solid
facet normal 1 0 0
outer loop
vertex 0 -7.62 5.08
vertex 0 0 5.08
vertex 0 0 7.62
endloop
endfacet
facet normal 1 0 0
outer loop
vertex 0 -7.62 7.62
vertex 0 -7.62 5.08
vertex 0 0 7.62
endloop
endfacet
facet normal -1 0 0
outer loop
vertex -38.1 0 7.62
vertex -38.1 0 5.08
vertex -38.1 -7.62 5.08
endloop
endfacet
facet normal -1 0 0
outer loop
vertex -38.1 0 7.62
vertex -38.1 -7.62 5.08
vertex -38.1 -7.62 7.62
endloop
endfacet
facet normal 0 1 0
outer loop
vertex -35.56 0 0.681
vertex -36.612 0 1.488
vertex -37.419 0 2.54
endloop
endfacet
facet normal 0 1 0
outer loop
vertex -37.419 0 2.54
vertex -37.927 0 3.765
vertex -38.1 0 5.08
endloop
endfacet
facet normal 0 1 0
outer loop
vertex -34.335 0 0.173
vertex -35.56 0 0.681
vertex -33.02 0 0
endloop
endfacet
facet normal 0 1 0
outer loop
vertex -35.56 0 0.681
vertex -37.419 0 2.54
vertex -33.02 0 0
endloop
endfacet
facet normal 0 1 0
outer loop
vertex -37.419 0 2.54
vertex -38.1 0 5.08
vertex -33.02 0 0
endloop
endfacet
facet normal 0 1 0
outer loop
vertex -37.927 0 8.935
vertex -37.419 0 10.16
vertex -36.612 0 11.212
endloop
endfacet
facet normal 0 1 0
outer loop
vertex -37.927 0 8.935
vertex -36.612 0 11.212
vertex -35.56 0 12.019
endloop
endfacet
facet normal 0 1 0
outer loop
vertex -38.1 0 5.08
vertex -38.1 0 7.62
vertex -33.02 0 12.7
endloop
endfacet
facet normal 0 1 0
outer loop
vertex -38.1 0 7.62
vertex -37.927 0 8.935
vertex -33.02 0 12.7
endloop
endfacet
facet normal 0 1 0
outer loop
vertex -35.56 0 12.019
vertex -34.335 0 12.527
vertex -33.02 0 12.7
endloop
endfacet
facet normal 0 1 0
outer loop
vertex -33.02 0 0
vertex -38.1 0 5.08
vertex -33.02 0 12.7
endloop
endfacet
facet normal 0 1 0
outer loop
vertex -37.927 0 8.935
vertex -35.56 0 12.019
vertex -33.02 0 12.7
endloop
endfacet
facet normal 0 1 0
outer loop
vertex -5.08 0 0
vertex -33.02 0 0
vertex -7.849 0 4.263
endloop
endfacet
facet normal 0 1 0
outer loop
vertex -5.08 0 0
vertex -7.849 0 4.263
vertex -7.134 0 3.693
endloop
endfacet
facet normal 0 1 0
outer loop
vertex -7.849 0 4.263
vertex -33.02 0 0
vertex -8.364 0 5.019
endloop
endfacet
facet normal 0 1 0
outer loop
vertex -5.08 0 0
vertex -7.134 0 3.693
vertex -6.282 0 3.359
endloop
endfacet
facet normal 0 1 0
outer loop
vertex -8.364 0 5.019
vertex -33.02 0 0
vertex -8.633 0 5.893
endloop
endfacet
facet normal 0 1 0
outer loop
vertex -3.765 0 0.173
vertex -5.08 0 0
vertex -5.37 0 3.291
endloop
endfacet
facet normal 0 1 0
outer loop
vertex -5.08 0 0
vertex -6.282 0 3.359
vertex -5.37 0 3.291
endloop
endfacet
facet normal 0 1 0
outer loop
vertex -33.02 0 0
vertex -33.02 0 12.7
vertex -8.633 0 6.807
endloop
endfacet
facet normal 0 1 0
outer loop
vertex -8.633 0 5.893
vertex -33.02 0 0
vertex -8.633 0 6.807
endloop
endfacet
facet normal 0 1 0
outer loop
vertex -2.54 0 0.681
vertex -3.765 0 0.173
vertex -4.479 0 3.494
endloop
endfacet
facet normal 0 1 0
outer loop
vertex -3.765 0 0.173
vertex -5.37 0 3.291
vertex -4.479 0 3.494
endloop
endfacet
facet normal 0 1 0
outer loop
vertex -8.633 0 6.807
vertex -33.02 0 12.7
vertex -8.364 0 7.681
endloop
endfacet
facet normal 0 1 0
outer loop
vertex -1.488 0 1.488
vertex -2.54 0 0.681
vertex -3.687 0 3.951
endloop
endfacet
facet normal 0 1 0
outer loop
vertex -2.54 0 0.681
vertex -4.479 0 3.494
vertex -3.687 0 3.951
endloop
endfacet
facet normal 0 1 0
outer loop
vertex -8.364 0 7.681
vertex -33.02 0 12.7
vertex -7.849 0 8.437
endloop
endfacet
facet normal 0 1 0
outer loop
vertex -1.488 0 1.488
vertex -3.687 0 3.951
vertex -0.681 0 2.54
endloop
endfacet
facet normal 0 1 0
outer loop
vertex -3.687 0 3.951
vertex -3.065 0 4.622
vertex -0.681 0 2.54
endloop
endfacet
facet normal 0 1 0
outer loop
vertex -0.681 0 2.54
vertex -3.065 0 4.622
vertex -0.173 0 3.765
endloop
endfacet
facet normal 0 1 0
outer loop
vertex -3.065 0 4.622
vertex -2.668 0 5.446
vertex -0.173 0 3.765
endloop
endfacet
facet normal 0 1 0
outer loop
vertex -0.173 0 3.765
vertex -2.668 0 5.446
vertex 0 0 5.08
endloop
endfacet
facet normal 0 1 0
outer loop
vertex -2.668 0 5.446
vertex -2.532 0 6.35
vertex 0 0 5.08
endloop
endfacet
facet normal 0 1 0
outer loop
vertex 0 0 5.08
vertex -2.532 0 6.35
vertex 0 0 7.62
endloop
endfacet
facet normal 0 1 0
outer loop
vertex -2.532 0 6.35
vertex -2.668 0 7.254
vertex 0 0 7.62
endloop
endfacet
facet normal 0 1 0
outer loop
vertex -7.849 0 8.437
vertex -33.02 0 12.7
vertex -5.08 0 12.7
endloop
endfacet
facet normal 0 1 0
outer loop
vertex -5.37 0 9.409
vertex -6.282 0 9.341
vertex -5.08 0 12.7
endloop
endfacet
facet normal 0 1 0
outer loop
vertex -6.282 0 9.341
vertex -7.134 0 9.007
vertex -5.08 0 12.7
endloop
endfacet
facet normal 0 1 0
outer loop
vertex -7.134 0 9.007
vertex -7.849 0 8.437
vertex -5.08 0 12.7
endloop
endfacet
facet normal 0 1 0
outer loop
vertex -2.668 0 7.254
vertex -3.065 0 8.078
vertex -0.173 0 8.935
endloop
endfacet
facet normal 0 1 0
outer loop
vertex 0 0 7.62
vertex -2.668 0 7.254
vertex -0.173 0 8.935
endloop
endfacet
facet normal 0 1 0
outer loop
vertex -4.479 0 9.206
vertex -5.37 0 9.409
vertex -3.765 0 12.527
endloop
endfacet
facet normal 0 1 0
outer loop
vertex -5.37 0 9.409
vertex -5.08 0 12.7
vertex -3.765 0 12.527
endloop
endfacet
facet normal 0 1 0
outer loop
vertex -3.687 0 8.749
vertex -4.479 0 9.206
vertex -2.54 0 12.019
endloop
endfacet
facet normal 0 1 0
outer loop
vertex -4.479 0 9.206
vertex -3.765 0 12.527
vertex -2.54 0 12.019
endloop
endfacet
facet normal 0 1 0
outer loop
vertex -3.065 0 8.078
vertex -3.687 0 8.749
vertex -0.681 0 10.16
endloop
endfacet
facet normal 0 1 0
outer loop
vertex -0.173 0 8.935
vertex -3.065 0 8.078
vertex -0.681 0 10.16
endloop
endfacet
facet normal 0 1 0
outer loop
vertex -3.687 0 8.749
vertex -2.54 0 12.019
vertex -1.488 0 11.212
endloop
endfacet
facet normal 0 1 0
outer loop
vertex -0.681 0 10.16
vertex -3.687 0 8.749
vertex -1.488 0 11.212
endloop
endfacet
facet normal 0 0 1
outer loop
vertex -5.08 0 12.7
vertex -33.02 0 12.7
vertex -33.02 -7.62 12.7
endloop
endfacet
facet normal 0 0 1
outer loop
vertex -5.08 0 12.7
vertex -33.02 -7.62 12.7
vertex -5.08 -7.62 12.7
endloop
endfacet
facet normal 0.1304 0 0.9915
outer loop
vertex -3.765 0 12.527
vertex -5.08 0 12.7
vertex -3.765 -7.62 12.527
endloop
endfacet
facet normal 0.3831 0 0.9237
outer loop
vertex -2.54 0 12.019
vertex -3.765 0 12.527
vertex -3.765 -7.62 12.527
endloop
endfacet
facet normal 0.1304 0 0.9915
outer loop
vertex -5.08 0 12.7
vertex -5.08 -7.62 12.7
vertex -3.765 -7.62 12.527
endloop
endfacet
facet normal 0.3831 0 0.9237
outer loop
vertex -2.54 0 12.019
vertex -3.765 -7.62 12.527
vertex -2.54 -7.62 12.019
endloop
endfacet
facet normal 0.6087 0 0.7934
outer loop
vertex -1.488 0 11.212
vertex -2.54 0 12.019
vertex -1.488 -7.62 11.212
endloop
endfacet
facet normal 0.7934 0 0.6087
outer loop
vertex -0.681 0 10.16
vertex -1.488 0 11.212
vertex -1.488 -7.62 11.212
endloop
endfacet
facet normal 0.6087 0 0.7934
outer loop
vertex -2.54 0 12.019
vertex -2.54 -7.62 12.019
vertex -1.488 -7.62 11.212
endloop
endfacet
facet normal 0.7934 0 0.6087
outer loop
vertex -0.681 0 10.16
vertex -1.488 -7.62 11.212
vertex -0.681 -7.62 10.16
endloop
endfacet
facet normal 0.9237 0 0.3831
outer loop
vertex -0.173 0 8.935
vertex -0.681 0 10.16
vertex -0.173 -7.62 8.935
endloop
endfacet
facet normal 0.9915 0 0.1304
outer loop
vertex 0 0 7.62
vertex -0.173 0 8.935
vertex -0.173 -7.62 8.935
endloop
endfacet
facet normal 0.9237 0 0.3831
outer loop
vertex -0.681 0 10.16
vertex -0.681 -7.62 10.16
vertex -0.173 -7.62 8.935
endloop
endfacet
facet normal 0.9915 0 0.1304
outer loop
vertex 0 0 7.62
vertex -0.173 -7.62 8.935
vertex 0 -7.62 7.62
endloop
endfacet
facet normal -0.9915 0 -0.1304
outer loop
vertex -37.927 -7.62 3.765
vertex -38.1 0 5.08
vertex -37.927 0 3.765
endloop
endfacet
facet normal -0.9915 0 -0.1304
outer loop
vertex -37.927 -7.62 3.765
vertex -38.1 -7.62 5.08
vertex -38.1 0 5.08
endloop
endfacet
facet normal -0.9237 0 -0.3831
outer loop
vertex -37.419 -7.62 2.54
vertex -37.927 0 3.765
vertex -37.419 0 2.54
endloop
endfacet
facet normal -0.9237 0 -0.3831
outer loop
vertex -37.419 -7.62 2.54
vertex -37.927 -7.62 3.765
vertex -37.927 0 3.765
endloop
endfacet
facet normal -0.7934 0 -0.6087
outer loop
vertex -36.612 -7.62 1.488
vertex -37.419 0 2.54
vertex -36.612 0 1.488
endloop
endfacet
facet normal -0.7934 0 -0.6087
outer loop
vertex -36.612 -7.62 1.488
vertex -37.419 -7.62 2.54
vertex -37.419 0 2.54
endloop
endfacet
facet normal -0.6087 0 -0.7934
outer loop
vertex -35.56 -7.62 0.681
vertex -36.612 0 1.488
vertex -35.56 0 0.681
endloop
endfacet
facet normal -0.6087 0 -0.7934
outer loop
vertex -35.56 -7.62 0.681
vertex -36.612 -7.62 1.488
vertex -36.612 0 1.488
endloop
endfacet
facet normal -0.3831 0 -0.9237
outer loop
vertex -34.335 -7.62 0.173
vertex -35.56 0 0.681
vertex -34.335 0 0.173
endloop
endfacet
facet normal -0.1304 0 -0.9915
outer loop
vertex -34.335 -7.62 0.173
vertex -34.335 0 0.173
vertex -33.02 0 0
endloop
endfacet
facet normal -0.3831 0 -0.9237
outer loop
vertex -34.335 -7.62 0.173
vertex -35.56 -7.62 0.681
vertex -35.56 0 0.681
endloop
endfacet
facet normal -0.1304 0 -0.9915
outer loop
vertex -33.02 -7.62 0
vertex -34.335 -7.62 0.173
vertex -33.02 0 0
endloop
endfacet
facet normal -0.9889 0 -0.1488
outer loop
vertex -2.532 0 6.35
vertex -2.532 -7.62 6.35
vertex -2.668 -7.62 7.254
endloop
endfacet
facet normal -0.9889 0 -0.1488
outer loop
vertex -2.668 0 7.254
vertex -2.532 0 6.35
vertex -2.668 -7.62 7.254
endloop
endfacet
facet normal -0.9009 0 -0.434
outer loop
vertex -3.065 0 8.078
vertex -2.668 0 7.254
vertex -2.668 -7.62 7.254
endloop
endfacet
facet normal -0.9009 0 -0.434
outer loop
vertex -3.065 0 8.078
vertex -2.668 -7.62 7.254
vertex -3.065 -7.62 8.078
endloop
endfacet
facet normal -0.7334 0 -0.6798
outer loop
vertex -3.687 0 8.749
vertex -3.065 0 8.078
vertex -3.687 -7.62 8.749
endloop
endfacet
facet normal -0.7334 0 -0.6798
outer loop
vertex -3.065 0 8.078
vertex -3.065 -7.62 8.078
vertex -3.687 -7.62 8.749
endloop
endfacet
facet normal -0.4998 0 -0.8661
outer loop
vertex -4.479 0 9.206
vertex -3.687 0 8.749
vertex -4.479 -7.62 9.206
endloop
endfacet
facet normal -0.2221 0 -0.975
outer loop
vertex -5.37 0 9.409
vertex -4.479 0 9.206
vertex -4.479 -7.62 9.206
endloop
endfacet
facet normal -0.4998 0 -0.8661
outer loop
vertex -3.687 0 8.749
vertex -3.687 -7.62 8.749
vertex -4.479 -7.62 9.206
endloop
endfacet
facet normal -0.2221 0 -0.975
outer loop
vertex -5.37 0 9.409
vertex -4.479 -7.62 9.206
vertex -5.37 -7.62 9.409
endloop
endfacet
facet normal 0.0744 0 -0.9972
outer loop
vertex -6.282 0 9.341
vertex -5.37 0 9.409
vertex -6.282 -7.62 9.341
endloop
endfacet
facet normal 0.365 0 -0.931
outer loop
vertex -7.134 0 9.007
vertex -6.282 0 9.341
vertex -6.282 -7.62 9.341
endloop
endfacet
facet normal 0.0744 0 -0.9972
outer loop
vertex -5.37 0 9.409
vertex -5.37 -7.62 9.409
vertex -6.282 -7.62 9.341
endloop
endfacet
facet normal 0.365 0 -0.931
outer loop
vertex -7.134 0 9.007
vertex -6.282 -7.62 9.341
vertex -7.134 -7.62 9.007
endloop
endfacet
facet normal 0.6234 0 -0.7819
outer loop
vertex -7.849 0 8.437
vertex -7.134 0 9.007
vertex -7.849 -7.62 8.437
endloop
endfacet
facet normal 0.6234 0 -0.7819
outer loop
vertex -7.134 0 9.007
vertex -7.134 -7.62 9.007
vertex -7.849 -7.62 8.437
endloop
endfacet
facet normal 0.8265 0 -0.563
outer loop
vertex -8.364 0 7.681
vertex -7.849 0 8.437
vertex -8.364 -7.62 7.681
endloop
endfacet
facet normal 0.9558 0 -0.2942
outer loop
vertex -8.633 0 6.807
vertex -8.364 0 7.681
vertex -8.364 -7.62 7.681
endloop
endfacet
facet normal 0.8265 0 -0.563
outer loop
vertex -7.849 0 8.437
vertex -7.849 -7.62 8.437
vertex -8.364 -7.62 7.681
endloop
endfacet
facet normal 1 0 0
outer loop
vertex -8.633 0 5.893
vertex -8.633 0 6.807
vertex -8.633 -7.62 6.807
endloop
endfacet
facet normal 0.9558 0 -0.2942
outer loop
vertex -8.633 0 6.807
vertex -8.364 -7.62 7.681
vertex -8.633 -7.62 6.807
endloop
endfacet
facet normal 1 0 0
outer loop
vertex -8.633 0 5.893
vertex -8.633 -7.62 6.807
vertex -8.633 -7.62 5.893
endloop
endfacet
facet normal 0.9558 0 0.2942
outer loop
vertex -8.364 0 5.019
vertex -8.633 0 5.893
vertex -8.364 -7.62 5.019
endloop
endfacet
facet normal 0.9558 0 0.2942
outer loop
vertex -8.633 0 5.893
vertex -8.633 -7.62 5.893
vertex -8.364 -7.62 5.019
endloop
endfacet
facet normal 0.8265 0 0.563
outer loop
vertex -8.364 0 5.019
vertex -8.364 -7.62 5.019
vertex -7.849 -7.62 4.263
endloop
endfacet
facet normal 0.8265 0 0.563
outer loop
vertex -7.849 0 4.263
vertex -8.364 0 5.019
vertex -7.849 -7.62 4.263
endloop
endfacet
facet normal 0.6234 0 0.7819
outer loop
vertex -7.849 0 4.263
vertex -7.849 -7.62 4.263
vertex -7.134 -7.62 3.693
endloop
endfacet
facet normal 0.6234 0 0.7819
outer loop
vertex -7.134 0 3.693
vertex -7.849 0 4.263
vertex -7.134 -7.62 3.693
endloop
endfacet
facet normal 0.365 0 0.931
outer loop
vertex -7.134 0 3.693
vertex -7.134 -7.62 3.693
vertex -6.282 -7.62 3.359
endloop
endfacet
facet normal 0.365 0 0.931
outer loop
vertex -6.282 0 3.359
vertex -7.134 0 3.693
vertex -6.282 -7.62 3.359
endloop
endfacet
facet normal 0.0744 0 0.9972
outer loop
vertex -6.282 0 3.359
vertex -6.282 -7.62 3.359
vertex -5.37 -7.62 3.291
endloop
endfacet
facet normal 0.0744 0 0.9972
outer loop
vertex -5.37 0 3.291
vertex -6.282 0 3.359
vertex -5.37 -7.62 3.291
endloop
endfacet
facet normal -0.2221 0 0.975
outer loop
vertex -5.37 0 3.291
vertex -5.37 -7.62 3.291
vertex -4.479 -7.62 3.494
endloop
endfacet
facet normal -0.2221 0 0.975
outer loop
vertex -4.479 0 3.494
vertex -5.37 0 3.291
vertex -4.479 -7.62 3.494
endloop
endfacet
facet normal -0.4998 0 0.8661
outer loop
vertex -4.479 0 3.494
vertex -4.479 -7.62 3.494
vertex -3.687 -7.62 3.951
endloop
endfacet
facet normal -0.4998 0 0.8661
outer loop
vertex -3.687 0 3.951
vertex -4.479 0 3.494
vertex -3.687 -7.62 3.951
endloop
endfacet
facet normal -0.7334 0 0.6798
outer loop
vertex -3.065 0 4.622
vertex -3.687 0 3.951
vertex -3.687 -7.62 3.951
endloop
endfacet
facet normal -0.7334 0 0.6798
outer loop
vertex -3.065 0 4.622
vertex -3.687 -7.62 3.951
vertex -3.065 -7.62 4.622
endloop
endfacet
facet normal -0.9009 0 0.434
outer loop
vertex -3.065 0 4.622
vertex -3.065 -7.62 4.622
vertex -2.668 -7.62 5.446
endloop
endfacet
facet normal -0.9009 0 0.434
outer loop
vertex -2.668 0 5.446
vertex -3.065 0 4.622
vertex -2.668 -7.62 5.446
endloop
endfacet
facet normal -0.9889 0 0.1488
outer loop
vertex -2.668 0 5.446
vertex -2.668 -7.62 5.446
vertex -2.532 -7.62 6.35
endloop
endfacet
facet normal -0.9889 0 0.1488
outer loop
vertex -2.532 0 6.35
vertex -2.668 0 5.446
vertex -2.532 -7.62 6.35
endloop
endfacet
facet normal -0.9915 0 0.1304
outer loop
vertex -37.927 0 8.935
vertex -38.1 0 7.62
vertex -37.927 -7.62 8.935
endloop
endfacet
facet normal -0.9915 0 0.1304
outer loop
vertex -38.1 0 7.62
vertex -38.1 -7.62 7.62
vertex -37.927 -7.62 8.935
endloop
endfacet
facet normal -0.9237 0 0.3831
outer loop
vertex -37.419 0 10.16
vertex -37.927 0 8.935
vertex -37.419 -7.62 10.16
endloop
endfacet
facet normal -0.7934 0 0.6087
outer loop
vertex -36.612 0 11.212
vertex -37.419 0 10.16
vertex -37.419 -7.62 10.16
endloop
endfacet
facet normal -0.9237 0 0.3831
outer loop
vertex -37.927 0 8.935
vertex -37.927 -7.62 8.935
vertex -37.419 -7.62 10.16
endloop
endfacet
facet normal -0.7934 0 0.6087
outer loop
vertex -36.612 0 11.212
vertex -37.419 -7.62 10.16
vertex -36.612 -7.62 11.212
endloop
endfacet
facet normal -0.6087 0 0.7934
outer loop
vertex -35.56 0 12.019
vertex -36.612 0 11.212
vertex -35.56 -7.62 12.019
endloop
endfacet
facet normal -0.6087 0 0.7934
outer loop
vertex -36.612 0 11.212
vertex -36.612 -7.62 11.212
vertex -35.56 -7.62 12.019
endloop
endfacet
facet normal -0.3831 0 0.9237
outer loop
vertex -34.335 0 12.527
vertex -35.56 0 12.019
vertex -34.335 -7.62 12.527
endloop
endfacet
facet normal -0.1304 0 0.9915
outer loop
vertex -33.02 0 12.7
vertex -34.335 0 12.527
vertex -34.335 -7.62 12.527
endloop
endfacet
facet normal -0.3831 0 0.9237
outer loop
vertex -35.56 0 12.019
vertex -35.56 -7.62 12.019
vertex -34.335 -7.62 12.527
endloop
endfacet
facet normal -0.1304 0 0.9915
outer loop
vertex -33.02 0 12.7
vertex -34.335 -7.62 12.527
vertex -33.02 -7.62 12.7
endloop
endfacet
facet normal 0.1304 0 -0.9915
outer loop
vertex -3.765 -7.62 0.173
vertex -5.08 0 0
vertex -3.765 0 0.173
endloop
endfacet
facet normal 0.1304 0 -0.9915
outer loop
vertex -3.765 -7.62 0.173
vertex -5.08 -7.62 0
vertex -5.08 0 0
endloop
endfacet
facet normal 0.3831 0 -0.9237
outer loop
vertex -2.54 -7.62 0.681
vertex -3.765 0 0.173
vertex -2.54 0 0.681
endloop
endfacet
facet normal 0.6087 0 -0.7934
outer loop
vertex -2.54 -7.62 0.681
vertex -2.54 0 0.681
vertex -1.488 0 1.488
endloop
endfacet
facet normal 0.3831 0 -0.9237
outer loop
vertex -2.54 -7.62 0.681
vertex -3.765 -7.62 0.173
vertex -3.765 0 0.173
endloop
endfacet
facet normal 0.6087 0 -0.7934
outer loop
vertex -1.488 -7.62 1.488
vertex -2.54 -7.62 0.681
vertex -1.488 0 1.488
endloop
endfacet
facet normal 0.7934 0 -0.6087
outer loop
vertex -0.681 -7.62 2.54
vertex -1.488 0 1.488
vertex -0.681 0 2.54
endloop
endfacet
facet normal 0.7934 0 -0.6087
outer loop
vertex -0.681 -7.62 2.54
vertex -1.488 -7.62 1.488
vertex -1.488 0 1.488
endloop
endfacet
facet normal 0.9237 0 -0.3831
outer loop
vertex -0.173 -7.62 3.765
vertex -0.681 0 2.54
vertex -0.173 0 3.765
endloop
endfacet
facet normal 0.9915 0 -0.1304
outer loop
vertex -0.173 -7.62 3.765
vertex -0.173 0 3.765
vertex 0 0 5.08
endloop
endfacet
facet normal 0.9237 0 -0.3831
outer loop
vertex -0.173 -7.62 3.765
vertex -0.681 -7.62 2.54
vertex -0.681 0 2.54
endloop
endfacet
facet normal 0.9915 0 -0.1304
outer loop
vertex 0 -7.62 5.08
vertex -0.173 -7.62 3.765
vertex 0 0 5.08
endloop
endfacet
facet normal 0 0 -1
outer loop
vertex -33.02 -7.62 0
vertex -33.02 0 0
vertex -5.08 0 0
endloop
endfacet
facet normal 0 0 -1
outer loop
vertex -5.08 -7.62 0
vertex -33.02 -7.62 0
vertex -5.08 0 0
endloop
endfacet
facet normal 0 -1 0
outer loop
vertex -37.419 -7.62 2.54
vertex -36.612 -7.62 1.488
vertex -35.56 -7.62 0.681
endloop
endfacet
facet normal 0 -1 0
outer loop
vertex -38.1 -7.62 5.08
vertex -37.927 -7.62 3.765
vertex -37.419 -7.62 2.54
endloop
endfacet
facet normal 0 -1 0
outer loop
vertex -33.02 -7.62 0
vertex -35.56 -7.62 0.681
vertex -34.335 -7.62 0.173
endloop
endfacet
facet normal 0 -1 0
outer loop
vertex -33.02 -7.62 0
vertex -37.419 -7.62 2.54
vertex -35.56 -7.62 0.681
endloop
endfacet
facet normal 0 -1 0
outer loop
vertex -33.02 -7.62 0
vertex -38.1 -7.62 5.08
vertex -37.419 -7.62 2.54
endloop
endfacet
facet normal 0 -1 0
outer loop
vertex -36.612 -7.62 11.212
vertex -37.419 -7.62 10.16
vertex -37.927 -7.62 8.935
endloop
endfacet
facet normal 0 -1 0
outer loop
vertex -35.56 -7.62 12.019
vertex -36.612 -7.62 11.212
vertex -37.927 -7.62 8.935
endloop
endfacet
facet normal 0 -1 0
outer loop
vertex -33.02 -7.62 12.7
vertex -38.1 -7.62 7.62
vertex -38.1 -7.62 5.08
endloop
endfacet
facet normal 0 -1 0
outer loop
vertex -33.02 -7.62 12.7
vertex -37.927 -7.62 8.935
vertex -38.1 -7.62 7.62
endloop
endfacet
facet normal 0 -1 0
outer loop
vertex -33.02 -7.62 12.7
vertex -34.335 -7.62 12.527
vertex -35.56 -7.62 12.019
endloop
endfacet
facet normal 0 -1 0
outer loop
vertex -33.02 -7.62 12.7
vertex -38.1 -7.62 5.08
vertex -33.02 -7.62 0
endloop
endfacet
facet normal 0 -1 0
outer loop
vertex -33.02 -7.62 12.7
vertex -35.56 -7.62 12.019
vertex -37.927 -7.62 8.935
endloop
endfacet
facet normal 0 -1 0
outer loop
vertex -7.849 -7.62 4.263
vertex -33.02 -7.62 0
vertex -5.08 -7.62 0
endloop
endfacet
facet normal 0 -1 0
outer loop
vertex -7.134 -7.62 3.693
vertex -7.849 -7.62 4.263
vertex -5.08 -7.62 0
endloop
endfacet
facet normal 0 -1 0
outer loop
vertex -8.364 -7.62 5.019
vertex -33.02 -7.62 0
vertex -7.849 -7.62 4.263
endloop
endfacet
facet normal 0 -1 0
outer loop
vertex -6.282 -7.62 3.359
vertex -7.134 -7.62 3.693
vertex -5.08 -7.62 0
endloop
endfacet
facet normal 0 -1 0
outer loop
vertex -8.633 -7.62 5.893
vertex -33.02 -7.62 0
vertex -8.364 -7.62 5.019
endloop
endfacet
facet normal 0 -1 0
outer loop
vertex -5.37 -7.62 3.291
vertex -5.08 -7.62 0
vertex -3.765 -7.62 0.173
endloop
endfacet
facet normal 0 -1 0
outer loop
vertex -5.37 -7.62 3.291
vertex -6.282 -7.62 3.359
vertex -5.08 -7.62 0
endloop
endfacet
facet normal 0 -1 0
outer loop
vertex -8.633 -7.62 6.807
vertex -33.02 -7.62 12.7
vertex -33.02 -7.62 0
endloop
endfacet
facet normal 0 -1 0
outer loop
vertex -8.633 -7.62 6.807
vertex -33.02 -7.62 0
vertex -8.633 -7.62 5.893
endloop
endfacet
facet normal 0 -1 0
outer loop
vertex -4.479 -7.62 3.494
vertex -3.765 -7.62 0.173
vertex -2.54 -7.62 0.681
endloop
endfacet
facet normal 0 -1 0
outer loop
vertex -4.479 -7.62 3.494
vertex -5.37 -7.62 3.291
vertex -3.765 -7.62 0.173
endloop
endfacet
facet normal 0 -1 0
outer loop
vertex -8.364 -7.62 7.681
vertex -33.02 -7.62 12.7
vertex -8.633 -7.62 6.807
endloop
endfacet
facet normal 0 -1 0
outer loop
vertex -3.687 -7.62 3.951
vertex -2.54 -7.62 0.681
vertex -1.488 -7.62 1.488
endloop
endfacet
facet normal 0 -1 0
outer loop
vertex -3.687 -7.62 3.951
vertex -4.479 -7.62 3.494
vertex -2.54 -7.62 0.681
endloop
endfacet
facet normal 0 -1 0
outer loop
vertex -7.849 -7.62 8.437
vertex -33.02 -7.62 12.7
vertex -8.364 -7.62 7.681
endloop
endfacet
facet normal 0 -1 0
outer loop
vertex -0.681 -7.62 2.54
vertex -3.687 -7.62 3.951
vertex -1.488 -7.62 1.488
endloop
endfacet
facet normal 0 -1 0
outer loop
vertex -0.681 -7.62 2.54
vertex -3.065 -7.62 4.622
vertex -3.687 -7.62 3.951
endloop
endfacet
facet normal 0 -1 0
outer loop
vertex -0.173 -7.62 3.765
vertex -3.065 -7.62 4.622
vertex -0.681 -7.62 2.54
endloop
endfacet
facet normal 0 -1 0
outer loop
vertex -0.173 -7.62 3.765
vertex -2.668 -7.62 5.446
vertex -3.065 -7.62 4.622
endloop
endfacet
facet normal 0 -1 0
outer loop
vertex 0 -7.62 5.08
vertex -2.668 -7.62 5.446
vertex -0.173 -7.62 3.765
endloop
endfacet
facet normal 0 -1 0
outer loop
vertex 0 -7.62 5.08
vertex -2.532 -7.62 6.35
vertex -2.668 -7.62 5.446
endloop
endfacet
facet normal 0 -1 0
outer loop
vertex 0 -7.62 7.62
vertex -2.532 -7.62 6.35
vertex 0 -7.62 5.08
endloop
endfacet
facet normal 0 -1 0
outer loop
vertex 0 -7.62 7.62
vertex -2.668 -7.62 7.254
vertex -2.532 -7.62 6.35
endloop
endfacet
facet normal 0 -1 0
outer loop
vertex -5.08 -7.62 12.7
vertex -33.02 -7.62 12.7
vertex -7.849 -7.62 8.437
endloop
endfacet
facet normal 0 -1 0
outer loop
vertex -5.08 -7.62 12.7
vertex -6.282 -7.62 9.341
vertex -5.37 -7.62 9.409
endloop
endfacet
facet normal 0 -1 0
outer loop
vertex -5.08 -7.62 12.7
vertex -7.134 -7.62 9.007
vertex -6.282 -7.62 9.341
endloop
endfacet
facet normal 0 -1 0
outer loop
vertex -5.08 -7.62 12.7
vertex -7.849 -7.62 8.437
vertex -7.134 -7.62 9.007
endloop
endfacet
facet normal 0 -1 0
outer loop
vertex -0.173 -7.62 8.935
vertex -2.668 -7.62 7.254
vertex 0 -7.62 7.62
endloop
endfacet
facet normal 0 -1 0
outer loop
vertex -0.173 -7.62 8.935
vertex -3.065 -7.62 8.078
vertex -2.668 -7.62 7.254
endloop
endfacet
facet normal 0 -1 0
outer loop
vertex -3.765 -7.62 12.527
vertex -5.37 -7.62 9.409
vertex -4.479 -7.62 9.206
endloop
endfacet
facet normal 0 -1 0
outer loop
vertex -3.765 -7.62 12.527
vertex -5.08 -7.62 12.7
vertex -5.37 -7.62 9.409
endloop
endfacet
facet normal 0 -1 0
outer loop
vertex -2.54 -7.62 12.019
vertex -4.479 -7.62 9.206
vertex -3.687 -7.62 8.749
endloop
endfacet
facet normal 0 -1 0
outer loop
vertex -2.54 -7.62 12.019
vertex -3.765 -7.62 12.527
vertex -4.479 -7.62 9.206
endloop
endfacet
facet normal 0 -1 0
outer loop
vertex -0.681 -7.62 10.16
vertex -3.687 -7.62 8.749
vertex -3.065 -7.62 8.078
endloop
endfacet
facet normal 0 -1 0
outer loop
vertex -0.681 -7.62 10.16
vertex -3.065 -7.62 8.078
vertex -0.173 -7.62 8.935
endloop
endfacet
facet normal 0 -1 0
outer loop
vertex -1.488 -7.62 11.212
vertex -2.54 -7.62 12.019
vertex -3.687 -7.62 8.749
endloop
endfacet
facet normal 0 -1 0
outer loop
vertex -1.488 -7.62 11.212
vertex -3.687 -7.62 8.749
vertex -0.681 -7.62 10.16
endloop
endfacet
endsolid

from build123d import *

# Parameters (mm, degrees)
F0_W     = 38.1
F0_H     = 12.7
F1_DEPTH = 7.62
F2_R     = 3.068034
F3_DEPTH = 7.621
F4_R     = 5.08


with BuildPart() as f1:
    # F0 (on Front) → F1 (new body)
    with BuildSketch(Plane.XZ):
        with Locations((-19.05, 6.35)):
            Rectangle(F0_W, F0_H)
    extrude(amount=F1_DEPTH)

    # F2 (on face) → F3 (cut, through all)
    with BuildSketch(Plane.XZ.offset(7.62)):
        with Locations((-5.599708, 6.35)):
            Circle(F2_R)
    extrude(amount=-F3_DEPTH, mode=Mode.SUBTRACT)

    # F4
    f4_edges = [f1.edges().sort_by_distance(p)[0] for p in [
        (0, -3.81, 12.7),
        (0, -3.81, 0),
        (-38.1, -3.81, 12.7),
        (-38.1, -3.81, 0),
    ]]
    fillet(f4_edges, radius=F4_R)


solid = f1.part
